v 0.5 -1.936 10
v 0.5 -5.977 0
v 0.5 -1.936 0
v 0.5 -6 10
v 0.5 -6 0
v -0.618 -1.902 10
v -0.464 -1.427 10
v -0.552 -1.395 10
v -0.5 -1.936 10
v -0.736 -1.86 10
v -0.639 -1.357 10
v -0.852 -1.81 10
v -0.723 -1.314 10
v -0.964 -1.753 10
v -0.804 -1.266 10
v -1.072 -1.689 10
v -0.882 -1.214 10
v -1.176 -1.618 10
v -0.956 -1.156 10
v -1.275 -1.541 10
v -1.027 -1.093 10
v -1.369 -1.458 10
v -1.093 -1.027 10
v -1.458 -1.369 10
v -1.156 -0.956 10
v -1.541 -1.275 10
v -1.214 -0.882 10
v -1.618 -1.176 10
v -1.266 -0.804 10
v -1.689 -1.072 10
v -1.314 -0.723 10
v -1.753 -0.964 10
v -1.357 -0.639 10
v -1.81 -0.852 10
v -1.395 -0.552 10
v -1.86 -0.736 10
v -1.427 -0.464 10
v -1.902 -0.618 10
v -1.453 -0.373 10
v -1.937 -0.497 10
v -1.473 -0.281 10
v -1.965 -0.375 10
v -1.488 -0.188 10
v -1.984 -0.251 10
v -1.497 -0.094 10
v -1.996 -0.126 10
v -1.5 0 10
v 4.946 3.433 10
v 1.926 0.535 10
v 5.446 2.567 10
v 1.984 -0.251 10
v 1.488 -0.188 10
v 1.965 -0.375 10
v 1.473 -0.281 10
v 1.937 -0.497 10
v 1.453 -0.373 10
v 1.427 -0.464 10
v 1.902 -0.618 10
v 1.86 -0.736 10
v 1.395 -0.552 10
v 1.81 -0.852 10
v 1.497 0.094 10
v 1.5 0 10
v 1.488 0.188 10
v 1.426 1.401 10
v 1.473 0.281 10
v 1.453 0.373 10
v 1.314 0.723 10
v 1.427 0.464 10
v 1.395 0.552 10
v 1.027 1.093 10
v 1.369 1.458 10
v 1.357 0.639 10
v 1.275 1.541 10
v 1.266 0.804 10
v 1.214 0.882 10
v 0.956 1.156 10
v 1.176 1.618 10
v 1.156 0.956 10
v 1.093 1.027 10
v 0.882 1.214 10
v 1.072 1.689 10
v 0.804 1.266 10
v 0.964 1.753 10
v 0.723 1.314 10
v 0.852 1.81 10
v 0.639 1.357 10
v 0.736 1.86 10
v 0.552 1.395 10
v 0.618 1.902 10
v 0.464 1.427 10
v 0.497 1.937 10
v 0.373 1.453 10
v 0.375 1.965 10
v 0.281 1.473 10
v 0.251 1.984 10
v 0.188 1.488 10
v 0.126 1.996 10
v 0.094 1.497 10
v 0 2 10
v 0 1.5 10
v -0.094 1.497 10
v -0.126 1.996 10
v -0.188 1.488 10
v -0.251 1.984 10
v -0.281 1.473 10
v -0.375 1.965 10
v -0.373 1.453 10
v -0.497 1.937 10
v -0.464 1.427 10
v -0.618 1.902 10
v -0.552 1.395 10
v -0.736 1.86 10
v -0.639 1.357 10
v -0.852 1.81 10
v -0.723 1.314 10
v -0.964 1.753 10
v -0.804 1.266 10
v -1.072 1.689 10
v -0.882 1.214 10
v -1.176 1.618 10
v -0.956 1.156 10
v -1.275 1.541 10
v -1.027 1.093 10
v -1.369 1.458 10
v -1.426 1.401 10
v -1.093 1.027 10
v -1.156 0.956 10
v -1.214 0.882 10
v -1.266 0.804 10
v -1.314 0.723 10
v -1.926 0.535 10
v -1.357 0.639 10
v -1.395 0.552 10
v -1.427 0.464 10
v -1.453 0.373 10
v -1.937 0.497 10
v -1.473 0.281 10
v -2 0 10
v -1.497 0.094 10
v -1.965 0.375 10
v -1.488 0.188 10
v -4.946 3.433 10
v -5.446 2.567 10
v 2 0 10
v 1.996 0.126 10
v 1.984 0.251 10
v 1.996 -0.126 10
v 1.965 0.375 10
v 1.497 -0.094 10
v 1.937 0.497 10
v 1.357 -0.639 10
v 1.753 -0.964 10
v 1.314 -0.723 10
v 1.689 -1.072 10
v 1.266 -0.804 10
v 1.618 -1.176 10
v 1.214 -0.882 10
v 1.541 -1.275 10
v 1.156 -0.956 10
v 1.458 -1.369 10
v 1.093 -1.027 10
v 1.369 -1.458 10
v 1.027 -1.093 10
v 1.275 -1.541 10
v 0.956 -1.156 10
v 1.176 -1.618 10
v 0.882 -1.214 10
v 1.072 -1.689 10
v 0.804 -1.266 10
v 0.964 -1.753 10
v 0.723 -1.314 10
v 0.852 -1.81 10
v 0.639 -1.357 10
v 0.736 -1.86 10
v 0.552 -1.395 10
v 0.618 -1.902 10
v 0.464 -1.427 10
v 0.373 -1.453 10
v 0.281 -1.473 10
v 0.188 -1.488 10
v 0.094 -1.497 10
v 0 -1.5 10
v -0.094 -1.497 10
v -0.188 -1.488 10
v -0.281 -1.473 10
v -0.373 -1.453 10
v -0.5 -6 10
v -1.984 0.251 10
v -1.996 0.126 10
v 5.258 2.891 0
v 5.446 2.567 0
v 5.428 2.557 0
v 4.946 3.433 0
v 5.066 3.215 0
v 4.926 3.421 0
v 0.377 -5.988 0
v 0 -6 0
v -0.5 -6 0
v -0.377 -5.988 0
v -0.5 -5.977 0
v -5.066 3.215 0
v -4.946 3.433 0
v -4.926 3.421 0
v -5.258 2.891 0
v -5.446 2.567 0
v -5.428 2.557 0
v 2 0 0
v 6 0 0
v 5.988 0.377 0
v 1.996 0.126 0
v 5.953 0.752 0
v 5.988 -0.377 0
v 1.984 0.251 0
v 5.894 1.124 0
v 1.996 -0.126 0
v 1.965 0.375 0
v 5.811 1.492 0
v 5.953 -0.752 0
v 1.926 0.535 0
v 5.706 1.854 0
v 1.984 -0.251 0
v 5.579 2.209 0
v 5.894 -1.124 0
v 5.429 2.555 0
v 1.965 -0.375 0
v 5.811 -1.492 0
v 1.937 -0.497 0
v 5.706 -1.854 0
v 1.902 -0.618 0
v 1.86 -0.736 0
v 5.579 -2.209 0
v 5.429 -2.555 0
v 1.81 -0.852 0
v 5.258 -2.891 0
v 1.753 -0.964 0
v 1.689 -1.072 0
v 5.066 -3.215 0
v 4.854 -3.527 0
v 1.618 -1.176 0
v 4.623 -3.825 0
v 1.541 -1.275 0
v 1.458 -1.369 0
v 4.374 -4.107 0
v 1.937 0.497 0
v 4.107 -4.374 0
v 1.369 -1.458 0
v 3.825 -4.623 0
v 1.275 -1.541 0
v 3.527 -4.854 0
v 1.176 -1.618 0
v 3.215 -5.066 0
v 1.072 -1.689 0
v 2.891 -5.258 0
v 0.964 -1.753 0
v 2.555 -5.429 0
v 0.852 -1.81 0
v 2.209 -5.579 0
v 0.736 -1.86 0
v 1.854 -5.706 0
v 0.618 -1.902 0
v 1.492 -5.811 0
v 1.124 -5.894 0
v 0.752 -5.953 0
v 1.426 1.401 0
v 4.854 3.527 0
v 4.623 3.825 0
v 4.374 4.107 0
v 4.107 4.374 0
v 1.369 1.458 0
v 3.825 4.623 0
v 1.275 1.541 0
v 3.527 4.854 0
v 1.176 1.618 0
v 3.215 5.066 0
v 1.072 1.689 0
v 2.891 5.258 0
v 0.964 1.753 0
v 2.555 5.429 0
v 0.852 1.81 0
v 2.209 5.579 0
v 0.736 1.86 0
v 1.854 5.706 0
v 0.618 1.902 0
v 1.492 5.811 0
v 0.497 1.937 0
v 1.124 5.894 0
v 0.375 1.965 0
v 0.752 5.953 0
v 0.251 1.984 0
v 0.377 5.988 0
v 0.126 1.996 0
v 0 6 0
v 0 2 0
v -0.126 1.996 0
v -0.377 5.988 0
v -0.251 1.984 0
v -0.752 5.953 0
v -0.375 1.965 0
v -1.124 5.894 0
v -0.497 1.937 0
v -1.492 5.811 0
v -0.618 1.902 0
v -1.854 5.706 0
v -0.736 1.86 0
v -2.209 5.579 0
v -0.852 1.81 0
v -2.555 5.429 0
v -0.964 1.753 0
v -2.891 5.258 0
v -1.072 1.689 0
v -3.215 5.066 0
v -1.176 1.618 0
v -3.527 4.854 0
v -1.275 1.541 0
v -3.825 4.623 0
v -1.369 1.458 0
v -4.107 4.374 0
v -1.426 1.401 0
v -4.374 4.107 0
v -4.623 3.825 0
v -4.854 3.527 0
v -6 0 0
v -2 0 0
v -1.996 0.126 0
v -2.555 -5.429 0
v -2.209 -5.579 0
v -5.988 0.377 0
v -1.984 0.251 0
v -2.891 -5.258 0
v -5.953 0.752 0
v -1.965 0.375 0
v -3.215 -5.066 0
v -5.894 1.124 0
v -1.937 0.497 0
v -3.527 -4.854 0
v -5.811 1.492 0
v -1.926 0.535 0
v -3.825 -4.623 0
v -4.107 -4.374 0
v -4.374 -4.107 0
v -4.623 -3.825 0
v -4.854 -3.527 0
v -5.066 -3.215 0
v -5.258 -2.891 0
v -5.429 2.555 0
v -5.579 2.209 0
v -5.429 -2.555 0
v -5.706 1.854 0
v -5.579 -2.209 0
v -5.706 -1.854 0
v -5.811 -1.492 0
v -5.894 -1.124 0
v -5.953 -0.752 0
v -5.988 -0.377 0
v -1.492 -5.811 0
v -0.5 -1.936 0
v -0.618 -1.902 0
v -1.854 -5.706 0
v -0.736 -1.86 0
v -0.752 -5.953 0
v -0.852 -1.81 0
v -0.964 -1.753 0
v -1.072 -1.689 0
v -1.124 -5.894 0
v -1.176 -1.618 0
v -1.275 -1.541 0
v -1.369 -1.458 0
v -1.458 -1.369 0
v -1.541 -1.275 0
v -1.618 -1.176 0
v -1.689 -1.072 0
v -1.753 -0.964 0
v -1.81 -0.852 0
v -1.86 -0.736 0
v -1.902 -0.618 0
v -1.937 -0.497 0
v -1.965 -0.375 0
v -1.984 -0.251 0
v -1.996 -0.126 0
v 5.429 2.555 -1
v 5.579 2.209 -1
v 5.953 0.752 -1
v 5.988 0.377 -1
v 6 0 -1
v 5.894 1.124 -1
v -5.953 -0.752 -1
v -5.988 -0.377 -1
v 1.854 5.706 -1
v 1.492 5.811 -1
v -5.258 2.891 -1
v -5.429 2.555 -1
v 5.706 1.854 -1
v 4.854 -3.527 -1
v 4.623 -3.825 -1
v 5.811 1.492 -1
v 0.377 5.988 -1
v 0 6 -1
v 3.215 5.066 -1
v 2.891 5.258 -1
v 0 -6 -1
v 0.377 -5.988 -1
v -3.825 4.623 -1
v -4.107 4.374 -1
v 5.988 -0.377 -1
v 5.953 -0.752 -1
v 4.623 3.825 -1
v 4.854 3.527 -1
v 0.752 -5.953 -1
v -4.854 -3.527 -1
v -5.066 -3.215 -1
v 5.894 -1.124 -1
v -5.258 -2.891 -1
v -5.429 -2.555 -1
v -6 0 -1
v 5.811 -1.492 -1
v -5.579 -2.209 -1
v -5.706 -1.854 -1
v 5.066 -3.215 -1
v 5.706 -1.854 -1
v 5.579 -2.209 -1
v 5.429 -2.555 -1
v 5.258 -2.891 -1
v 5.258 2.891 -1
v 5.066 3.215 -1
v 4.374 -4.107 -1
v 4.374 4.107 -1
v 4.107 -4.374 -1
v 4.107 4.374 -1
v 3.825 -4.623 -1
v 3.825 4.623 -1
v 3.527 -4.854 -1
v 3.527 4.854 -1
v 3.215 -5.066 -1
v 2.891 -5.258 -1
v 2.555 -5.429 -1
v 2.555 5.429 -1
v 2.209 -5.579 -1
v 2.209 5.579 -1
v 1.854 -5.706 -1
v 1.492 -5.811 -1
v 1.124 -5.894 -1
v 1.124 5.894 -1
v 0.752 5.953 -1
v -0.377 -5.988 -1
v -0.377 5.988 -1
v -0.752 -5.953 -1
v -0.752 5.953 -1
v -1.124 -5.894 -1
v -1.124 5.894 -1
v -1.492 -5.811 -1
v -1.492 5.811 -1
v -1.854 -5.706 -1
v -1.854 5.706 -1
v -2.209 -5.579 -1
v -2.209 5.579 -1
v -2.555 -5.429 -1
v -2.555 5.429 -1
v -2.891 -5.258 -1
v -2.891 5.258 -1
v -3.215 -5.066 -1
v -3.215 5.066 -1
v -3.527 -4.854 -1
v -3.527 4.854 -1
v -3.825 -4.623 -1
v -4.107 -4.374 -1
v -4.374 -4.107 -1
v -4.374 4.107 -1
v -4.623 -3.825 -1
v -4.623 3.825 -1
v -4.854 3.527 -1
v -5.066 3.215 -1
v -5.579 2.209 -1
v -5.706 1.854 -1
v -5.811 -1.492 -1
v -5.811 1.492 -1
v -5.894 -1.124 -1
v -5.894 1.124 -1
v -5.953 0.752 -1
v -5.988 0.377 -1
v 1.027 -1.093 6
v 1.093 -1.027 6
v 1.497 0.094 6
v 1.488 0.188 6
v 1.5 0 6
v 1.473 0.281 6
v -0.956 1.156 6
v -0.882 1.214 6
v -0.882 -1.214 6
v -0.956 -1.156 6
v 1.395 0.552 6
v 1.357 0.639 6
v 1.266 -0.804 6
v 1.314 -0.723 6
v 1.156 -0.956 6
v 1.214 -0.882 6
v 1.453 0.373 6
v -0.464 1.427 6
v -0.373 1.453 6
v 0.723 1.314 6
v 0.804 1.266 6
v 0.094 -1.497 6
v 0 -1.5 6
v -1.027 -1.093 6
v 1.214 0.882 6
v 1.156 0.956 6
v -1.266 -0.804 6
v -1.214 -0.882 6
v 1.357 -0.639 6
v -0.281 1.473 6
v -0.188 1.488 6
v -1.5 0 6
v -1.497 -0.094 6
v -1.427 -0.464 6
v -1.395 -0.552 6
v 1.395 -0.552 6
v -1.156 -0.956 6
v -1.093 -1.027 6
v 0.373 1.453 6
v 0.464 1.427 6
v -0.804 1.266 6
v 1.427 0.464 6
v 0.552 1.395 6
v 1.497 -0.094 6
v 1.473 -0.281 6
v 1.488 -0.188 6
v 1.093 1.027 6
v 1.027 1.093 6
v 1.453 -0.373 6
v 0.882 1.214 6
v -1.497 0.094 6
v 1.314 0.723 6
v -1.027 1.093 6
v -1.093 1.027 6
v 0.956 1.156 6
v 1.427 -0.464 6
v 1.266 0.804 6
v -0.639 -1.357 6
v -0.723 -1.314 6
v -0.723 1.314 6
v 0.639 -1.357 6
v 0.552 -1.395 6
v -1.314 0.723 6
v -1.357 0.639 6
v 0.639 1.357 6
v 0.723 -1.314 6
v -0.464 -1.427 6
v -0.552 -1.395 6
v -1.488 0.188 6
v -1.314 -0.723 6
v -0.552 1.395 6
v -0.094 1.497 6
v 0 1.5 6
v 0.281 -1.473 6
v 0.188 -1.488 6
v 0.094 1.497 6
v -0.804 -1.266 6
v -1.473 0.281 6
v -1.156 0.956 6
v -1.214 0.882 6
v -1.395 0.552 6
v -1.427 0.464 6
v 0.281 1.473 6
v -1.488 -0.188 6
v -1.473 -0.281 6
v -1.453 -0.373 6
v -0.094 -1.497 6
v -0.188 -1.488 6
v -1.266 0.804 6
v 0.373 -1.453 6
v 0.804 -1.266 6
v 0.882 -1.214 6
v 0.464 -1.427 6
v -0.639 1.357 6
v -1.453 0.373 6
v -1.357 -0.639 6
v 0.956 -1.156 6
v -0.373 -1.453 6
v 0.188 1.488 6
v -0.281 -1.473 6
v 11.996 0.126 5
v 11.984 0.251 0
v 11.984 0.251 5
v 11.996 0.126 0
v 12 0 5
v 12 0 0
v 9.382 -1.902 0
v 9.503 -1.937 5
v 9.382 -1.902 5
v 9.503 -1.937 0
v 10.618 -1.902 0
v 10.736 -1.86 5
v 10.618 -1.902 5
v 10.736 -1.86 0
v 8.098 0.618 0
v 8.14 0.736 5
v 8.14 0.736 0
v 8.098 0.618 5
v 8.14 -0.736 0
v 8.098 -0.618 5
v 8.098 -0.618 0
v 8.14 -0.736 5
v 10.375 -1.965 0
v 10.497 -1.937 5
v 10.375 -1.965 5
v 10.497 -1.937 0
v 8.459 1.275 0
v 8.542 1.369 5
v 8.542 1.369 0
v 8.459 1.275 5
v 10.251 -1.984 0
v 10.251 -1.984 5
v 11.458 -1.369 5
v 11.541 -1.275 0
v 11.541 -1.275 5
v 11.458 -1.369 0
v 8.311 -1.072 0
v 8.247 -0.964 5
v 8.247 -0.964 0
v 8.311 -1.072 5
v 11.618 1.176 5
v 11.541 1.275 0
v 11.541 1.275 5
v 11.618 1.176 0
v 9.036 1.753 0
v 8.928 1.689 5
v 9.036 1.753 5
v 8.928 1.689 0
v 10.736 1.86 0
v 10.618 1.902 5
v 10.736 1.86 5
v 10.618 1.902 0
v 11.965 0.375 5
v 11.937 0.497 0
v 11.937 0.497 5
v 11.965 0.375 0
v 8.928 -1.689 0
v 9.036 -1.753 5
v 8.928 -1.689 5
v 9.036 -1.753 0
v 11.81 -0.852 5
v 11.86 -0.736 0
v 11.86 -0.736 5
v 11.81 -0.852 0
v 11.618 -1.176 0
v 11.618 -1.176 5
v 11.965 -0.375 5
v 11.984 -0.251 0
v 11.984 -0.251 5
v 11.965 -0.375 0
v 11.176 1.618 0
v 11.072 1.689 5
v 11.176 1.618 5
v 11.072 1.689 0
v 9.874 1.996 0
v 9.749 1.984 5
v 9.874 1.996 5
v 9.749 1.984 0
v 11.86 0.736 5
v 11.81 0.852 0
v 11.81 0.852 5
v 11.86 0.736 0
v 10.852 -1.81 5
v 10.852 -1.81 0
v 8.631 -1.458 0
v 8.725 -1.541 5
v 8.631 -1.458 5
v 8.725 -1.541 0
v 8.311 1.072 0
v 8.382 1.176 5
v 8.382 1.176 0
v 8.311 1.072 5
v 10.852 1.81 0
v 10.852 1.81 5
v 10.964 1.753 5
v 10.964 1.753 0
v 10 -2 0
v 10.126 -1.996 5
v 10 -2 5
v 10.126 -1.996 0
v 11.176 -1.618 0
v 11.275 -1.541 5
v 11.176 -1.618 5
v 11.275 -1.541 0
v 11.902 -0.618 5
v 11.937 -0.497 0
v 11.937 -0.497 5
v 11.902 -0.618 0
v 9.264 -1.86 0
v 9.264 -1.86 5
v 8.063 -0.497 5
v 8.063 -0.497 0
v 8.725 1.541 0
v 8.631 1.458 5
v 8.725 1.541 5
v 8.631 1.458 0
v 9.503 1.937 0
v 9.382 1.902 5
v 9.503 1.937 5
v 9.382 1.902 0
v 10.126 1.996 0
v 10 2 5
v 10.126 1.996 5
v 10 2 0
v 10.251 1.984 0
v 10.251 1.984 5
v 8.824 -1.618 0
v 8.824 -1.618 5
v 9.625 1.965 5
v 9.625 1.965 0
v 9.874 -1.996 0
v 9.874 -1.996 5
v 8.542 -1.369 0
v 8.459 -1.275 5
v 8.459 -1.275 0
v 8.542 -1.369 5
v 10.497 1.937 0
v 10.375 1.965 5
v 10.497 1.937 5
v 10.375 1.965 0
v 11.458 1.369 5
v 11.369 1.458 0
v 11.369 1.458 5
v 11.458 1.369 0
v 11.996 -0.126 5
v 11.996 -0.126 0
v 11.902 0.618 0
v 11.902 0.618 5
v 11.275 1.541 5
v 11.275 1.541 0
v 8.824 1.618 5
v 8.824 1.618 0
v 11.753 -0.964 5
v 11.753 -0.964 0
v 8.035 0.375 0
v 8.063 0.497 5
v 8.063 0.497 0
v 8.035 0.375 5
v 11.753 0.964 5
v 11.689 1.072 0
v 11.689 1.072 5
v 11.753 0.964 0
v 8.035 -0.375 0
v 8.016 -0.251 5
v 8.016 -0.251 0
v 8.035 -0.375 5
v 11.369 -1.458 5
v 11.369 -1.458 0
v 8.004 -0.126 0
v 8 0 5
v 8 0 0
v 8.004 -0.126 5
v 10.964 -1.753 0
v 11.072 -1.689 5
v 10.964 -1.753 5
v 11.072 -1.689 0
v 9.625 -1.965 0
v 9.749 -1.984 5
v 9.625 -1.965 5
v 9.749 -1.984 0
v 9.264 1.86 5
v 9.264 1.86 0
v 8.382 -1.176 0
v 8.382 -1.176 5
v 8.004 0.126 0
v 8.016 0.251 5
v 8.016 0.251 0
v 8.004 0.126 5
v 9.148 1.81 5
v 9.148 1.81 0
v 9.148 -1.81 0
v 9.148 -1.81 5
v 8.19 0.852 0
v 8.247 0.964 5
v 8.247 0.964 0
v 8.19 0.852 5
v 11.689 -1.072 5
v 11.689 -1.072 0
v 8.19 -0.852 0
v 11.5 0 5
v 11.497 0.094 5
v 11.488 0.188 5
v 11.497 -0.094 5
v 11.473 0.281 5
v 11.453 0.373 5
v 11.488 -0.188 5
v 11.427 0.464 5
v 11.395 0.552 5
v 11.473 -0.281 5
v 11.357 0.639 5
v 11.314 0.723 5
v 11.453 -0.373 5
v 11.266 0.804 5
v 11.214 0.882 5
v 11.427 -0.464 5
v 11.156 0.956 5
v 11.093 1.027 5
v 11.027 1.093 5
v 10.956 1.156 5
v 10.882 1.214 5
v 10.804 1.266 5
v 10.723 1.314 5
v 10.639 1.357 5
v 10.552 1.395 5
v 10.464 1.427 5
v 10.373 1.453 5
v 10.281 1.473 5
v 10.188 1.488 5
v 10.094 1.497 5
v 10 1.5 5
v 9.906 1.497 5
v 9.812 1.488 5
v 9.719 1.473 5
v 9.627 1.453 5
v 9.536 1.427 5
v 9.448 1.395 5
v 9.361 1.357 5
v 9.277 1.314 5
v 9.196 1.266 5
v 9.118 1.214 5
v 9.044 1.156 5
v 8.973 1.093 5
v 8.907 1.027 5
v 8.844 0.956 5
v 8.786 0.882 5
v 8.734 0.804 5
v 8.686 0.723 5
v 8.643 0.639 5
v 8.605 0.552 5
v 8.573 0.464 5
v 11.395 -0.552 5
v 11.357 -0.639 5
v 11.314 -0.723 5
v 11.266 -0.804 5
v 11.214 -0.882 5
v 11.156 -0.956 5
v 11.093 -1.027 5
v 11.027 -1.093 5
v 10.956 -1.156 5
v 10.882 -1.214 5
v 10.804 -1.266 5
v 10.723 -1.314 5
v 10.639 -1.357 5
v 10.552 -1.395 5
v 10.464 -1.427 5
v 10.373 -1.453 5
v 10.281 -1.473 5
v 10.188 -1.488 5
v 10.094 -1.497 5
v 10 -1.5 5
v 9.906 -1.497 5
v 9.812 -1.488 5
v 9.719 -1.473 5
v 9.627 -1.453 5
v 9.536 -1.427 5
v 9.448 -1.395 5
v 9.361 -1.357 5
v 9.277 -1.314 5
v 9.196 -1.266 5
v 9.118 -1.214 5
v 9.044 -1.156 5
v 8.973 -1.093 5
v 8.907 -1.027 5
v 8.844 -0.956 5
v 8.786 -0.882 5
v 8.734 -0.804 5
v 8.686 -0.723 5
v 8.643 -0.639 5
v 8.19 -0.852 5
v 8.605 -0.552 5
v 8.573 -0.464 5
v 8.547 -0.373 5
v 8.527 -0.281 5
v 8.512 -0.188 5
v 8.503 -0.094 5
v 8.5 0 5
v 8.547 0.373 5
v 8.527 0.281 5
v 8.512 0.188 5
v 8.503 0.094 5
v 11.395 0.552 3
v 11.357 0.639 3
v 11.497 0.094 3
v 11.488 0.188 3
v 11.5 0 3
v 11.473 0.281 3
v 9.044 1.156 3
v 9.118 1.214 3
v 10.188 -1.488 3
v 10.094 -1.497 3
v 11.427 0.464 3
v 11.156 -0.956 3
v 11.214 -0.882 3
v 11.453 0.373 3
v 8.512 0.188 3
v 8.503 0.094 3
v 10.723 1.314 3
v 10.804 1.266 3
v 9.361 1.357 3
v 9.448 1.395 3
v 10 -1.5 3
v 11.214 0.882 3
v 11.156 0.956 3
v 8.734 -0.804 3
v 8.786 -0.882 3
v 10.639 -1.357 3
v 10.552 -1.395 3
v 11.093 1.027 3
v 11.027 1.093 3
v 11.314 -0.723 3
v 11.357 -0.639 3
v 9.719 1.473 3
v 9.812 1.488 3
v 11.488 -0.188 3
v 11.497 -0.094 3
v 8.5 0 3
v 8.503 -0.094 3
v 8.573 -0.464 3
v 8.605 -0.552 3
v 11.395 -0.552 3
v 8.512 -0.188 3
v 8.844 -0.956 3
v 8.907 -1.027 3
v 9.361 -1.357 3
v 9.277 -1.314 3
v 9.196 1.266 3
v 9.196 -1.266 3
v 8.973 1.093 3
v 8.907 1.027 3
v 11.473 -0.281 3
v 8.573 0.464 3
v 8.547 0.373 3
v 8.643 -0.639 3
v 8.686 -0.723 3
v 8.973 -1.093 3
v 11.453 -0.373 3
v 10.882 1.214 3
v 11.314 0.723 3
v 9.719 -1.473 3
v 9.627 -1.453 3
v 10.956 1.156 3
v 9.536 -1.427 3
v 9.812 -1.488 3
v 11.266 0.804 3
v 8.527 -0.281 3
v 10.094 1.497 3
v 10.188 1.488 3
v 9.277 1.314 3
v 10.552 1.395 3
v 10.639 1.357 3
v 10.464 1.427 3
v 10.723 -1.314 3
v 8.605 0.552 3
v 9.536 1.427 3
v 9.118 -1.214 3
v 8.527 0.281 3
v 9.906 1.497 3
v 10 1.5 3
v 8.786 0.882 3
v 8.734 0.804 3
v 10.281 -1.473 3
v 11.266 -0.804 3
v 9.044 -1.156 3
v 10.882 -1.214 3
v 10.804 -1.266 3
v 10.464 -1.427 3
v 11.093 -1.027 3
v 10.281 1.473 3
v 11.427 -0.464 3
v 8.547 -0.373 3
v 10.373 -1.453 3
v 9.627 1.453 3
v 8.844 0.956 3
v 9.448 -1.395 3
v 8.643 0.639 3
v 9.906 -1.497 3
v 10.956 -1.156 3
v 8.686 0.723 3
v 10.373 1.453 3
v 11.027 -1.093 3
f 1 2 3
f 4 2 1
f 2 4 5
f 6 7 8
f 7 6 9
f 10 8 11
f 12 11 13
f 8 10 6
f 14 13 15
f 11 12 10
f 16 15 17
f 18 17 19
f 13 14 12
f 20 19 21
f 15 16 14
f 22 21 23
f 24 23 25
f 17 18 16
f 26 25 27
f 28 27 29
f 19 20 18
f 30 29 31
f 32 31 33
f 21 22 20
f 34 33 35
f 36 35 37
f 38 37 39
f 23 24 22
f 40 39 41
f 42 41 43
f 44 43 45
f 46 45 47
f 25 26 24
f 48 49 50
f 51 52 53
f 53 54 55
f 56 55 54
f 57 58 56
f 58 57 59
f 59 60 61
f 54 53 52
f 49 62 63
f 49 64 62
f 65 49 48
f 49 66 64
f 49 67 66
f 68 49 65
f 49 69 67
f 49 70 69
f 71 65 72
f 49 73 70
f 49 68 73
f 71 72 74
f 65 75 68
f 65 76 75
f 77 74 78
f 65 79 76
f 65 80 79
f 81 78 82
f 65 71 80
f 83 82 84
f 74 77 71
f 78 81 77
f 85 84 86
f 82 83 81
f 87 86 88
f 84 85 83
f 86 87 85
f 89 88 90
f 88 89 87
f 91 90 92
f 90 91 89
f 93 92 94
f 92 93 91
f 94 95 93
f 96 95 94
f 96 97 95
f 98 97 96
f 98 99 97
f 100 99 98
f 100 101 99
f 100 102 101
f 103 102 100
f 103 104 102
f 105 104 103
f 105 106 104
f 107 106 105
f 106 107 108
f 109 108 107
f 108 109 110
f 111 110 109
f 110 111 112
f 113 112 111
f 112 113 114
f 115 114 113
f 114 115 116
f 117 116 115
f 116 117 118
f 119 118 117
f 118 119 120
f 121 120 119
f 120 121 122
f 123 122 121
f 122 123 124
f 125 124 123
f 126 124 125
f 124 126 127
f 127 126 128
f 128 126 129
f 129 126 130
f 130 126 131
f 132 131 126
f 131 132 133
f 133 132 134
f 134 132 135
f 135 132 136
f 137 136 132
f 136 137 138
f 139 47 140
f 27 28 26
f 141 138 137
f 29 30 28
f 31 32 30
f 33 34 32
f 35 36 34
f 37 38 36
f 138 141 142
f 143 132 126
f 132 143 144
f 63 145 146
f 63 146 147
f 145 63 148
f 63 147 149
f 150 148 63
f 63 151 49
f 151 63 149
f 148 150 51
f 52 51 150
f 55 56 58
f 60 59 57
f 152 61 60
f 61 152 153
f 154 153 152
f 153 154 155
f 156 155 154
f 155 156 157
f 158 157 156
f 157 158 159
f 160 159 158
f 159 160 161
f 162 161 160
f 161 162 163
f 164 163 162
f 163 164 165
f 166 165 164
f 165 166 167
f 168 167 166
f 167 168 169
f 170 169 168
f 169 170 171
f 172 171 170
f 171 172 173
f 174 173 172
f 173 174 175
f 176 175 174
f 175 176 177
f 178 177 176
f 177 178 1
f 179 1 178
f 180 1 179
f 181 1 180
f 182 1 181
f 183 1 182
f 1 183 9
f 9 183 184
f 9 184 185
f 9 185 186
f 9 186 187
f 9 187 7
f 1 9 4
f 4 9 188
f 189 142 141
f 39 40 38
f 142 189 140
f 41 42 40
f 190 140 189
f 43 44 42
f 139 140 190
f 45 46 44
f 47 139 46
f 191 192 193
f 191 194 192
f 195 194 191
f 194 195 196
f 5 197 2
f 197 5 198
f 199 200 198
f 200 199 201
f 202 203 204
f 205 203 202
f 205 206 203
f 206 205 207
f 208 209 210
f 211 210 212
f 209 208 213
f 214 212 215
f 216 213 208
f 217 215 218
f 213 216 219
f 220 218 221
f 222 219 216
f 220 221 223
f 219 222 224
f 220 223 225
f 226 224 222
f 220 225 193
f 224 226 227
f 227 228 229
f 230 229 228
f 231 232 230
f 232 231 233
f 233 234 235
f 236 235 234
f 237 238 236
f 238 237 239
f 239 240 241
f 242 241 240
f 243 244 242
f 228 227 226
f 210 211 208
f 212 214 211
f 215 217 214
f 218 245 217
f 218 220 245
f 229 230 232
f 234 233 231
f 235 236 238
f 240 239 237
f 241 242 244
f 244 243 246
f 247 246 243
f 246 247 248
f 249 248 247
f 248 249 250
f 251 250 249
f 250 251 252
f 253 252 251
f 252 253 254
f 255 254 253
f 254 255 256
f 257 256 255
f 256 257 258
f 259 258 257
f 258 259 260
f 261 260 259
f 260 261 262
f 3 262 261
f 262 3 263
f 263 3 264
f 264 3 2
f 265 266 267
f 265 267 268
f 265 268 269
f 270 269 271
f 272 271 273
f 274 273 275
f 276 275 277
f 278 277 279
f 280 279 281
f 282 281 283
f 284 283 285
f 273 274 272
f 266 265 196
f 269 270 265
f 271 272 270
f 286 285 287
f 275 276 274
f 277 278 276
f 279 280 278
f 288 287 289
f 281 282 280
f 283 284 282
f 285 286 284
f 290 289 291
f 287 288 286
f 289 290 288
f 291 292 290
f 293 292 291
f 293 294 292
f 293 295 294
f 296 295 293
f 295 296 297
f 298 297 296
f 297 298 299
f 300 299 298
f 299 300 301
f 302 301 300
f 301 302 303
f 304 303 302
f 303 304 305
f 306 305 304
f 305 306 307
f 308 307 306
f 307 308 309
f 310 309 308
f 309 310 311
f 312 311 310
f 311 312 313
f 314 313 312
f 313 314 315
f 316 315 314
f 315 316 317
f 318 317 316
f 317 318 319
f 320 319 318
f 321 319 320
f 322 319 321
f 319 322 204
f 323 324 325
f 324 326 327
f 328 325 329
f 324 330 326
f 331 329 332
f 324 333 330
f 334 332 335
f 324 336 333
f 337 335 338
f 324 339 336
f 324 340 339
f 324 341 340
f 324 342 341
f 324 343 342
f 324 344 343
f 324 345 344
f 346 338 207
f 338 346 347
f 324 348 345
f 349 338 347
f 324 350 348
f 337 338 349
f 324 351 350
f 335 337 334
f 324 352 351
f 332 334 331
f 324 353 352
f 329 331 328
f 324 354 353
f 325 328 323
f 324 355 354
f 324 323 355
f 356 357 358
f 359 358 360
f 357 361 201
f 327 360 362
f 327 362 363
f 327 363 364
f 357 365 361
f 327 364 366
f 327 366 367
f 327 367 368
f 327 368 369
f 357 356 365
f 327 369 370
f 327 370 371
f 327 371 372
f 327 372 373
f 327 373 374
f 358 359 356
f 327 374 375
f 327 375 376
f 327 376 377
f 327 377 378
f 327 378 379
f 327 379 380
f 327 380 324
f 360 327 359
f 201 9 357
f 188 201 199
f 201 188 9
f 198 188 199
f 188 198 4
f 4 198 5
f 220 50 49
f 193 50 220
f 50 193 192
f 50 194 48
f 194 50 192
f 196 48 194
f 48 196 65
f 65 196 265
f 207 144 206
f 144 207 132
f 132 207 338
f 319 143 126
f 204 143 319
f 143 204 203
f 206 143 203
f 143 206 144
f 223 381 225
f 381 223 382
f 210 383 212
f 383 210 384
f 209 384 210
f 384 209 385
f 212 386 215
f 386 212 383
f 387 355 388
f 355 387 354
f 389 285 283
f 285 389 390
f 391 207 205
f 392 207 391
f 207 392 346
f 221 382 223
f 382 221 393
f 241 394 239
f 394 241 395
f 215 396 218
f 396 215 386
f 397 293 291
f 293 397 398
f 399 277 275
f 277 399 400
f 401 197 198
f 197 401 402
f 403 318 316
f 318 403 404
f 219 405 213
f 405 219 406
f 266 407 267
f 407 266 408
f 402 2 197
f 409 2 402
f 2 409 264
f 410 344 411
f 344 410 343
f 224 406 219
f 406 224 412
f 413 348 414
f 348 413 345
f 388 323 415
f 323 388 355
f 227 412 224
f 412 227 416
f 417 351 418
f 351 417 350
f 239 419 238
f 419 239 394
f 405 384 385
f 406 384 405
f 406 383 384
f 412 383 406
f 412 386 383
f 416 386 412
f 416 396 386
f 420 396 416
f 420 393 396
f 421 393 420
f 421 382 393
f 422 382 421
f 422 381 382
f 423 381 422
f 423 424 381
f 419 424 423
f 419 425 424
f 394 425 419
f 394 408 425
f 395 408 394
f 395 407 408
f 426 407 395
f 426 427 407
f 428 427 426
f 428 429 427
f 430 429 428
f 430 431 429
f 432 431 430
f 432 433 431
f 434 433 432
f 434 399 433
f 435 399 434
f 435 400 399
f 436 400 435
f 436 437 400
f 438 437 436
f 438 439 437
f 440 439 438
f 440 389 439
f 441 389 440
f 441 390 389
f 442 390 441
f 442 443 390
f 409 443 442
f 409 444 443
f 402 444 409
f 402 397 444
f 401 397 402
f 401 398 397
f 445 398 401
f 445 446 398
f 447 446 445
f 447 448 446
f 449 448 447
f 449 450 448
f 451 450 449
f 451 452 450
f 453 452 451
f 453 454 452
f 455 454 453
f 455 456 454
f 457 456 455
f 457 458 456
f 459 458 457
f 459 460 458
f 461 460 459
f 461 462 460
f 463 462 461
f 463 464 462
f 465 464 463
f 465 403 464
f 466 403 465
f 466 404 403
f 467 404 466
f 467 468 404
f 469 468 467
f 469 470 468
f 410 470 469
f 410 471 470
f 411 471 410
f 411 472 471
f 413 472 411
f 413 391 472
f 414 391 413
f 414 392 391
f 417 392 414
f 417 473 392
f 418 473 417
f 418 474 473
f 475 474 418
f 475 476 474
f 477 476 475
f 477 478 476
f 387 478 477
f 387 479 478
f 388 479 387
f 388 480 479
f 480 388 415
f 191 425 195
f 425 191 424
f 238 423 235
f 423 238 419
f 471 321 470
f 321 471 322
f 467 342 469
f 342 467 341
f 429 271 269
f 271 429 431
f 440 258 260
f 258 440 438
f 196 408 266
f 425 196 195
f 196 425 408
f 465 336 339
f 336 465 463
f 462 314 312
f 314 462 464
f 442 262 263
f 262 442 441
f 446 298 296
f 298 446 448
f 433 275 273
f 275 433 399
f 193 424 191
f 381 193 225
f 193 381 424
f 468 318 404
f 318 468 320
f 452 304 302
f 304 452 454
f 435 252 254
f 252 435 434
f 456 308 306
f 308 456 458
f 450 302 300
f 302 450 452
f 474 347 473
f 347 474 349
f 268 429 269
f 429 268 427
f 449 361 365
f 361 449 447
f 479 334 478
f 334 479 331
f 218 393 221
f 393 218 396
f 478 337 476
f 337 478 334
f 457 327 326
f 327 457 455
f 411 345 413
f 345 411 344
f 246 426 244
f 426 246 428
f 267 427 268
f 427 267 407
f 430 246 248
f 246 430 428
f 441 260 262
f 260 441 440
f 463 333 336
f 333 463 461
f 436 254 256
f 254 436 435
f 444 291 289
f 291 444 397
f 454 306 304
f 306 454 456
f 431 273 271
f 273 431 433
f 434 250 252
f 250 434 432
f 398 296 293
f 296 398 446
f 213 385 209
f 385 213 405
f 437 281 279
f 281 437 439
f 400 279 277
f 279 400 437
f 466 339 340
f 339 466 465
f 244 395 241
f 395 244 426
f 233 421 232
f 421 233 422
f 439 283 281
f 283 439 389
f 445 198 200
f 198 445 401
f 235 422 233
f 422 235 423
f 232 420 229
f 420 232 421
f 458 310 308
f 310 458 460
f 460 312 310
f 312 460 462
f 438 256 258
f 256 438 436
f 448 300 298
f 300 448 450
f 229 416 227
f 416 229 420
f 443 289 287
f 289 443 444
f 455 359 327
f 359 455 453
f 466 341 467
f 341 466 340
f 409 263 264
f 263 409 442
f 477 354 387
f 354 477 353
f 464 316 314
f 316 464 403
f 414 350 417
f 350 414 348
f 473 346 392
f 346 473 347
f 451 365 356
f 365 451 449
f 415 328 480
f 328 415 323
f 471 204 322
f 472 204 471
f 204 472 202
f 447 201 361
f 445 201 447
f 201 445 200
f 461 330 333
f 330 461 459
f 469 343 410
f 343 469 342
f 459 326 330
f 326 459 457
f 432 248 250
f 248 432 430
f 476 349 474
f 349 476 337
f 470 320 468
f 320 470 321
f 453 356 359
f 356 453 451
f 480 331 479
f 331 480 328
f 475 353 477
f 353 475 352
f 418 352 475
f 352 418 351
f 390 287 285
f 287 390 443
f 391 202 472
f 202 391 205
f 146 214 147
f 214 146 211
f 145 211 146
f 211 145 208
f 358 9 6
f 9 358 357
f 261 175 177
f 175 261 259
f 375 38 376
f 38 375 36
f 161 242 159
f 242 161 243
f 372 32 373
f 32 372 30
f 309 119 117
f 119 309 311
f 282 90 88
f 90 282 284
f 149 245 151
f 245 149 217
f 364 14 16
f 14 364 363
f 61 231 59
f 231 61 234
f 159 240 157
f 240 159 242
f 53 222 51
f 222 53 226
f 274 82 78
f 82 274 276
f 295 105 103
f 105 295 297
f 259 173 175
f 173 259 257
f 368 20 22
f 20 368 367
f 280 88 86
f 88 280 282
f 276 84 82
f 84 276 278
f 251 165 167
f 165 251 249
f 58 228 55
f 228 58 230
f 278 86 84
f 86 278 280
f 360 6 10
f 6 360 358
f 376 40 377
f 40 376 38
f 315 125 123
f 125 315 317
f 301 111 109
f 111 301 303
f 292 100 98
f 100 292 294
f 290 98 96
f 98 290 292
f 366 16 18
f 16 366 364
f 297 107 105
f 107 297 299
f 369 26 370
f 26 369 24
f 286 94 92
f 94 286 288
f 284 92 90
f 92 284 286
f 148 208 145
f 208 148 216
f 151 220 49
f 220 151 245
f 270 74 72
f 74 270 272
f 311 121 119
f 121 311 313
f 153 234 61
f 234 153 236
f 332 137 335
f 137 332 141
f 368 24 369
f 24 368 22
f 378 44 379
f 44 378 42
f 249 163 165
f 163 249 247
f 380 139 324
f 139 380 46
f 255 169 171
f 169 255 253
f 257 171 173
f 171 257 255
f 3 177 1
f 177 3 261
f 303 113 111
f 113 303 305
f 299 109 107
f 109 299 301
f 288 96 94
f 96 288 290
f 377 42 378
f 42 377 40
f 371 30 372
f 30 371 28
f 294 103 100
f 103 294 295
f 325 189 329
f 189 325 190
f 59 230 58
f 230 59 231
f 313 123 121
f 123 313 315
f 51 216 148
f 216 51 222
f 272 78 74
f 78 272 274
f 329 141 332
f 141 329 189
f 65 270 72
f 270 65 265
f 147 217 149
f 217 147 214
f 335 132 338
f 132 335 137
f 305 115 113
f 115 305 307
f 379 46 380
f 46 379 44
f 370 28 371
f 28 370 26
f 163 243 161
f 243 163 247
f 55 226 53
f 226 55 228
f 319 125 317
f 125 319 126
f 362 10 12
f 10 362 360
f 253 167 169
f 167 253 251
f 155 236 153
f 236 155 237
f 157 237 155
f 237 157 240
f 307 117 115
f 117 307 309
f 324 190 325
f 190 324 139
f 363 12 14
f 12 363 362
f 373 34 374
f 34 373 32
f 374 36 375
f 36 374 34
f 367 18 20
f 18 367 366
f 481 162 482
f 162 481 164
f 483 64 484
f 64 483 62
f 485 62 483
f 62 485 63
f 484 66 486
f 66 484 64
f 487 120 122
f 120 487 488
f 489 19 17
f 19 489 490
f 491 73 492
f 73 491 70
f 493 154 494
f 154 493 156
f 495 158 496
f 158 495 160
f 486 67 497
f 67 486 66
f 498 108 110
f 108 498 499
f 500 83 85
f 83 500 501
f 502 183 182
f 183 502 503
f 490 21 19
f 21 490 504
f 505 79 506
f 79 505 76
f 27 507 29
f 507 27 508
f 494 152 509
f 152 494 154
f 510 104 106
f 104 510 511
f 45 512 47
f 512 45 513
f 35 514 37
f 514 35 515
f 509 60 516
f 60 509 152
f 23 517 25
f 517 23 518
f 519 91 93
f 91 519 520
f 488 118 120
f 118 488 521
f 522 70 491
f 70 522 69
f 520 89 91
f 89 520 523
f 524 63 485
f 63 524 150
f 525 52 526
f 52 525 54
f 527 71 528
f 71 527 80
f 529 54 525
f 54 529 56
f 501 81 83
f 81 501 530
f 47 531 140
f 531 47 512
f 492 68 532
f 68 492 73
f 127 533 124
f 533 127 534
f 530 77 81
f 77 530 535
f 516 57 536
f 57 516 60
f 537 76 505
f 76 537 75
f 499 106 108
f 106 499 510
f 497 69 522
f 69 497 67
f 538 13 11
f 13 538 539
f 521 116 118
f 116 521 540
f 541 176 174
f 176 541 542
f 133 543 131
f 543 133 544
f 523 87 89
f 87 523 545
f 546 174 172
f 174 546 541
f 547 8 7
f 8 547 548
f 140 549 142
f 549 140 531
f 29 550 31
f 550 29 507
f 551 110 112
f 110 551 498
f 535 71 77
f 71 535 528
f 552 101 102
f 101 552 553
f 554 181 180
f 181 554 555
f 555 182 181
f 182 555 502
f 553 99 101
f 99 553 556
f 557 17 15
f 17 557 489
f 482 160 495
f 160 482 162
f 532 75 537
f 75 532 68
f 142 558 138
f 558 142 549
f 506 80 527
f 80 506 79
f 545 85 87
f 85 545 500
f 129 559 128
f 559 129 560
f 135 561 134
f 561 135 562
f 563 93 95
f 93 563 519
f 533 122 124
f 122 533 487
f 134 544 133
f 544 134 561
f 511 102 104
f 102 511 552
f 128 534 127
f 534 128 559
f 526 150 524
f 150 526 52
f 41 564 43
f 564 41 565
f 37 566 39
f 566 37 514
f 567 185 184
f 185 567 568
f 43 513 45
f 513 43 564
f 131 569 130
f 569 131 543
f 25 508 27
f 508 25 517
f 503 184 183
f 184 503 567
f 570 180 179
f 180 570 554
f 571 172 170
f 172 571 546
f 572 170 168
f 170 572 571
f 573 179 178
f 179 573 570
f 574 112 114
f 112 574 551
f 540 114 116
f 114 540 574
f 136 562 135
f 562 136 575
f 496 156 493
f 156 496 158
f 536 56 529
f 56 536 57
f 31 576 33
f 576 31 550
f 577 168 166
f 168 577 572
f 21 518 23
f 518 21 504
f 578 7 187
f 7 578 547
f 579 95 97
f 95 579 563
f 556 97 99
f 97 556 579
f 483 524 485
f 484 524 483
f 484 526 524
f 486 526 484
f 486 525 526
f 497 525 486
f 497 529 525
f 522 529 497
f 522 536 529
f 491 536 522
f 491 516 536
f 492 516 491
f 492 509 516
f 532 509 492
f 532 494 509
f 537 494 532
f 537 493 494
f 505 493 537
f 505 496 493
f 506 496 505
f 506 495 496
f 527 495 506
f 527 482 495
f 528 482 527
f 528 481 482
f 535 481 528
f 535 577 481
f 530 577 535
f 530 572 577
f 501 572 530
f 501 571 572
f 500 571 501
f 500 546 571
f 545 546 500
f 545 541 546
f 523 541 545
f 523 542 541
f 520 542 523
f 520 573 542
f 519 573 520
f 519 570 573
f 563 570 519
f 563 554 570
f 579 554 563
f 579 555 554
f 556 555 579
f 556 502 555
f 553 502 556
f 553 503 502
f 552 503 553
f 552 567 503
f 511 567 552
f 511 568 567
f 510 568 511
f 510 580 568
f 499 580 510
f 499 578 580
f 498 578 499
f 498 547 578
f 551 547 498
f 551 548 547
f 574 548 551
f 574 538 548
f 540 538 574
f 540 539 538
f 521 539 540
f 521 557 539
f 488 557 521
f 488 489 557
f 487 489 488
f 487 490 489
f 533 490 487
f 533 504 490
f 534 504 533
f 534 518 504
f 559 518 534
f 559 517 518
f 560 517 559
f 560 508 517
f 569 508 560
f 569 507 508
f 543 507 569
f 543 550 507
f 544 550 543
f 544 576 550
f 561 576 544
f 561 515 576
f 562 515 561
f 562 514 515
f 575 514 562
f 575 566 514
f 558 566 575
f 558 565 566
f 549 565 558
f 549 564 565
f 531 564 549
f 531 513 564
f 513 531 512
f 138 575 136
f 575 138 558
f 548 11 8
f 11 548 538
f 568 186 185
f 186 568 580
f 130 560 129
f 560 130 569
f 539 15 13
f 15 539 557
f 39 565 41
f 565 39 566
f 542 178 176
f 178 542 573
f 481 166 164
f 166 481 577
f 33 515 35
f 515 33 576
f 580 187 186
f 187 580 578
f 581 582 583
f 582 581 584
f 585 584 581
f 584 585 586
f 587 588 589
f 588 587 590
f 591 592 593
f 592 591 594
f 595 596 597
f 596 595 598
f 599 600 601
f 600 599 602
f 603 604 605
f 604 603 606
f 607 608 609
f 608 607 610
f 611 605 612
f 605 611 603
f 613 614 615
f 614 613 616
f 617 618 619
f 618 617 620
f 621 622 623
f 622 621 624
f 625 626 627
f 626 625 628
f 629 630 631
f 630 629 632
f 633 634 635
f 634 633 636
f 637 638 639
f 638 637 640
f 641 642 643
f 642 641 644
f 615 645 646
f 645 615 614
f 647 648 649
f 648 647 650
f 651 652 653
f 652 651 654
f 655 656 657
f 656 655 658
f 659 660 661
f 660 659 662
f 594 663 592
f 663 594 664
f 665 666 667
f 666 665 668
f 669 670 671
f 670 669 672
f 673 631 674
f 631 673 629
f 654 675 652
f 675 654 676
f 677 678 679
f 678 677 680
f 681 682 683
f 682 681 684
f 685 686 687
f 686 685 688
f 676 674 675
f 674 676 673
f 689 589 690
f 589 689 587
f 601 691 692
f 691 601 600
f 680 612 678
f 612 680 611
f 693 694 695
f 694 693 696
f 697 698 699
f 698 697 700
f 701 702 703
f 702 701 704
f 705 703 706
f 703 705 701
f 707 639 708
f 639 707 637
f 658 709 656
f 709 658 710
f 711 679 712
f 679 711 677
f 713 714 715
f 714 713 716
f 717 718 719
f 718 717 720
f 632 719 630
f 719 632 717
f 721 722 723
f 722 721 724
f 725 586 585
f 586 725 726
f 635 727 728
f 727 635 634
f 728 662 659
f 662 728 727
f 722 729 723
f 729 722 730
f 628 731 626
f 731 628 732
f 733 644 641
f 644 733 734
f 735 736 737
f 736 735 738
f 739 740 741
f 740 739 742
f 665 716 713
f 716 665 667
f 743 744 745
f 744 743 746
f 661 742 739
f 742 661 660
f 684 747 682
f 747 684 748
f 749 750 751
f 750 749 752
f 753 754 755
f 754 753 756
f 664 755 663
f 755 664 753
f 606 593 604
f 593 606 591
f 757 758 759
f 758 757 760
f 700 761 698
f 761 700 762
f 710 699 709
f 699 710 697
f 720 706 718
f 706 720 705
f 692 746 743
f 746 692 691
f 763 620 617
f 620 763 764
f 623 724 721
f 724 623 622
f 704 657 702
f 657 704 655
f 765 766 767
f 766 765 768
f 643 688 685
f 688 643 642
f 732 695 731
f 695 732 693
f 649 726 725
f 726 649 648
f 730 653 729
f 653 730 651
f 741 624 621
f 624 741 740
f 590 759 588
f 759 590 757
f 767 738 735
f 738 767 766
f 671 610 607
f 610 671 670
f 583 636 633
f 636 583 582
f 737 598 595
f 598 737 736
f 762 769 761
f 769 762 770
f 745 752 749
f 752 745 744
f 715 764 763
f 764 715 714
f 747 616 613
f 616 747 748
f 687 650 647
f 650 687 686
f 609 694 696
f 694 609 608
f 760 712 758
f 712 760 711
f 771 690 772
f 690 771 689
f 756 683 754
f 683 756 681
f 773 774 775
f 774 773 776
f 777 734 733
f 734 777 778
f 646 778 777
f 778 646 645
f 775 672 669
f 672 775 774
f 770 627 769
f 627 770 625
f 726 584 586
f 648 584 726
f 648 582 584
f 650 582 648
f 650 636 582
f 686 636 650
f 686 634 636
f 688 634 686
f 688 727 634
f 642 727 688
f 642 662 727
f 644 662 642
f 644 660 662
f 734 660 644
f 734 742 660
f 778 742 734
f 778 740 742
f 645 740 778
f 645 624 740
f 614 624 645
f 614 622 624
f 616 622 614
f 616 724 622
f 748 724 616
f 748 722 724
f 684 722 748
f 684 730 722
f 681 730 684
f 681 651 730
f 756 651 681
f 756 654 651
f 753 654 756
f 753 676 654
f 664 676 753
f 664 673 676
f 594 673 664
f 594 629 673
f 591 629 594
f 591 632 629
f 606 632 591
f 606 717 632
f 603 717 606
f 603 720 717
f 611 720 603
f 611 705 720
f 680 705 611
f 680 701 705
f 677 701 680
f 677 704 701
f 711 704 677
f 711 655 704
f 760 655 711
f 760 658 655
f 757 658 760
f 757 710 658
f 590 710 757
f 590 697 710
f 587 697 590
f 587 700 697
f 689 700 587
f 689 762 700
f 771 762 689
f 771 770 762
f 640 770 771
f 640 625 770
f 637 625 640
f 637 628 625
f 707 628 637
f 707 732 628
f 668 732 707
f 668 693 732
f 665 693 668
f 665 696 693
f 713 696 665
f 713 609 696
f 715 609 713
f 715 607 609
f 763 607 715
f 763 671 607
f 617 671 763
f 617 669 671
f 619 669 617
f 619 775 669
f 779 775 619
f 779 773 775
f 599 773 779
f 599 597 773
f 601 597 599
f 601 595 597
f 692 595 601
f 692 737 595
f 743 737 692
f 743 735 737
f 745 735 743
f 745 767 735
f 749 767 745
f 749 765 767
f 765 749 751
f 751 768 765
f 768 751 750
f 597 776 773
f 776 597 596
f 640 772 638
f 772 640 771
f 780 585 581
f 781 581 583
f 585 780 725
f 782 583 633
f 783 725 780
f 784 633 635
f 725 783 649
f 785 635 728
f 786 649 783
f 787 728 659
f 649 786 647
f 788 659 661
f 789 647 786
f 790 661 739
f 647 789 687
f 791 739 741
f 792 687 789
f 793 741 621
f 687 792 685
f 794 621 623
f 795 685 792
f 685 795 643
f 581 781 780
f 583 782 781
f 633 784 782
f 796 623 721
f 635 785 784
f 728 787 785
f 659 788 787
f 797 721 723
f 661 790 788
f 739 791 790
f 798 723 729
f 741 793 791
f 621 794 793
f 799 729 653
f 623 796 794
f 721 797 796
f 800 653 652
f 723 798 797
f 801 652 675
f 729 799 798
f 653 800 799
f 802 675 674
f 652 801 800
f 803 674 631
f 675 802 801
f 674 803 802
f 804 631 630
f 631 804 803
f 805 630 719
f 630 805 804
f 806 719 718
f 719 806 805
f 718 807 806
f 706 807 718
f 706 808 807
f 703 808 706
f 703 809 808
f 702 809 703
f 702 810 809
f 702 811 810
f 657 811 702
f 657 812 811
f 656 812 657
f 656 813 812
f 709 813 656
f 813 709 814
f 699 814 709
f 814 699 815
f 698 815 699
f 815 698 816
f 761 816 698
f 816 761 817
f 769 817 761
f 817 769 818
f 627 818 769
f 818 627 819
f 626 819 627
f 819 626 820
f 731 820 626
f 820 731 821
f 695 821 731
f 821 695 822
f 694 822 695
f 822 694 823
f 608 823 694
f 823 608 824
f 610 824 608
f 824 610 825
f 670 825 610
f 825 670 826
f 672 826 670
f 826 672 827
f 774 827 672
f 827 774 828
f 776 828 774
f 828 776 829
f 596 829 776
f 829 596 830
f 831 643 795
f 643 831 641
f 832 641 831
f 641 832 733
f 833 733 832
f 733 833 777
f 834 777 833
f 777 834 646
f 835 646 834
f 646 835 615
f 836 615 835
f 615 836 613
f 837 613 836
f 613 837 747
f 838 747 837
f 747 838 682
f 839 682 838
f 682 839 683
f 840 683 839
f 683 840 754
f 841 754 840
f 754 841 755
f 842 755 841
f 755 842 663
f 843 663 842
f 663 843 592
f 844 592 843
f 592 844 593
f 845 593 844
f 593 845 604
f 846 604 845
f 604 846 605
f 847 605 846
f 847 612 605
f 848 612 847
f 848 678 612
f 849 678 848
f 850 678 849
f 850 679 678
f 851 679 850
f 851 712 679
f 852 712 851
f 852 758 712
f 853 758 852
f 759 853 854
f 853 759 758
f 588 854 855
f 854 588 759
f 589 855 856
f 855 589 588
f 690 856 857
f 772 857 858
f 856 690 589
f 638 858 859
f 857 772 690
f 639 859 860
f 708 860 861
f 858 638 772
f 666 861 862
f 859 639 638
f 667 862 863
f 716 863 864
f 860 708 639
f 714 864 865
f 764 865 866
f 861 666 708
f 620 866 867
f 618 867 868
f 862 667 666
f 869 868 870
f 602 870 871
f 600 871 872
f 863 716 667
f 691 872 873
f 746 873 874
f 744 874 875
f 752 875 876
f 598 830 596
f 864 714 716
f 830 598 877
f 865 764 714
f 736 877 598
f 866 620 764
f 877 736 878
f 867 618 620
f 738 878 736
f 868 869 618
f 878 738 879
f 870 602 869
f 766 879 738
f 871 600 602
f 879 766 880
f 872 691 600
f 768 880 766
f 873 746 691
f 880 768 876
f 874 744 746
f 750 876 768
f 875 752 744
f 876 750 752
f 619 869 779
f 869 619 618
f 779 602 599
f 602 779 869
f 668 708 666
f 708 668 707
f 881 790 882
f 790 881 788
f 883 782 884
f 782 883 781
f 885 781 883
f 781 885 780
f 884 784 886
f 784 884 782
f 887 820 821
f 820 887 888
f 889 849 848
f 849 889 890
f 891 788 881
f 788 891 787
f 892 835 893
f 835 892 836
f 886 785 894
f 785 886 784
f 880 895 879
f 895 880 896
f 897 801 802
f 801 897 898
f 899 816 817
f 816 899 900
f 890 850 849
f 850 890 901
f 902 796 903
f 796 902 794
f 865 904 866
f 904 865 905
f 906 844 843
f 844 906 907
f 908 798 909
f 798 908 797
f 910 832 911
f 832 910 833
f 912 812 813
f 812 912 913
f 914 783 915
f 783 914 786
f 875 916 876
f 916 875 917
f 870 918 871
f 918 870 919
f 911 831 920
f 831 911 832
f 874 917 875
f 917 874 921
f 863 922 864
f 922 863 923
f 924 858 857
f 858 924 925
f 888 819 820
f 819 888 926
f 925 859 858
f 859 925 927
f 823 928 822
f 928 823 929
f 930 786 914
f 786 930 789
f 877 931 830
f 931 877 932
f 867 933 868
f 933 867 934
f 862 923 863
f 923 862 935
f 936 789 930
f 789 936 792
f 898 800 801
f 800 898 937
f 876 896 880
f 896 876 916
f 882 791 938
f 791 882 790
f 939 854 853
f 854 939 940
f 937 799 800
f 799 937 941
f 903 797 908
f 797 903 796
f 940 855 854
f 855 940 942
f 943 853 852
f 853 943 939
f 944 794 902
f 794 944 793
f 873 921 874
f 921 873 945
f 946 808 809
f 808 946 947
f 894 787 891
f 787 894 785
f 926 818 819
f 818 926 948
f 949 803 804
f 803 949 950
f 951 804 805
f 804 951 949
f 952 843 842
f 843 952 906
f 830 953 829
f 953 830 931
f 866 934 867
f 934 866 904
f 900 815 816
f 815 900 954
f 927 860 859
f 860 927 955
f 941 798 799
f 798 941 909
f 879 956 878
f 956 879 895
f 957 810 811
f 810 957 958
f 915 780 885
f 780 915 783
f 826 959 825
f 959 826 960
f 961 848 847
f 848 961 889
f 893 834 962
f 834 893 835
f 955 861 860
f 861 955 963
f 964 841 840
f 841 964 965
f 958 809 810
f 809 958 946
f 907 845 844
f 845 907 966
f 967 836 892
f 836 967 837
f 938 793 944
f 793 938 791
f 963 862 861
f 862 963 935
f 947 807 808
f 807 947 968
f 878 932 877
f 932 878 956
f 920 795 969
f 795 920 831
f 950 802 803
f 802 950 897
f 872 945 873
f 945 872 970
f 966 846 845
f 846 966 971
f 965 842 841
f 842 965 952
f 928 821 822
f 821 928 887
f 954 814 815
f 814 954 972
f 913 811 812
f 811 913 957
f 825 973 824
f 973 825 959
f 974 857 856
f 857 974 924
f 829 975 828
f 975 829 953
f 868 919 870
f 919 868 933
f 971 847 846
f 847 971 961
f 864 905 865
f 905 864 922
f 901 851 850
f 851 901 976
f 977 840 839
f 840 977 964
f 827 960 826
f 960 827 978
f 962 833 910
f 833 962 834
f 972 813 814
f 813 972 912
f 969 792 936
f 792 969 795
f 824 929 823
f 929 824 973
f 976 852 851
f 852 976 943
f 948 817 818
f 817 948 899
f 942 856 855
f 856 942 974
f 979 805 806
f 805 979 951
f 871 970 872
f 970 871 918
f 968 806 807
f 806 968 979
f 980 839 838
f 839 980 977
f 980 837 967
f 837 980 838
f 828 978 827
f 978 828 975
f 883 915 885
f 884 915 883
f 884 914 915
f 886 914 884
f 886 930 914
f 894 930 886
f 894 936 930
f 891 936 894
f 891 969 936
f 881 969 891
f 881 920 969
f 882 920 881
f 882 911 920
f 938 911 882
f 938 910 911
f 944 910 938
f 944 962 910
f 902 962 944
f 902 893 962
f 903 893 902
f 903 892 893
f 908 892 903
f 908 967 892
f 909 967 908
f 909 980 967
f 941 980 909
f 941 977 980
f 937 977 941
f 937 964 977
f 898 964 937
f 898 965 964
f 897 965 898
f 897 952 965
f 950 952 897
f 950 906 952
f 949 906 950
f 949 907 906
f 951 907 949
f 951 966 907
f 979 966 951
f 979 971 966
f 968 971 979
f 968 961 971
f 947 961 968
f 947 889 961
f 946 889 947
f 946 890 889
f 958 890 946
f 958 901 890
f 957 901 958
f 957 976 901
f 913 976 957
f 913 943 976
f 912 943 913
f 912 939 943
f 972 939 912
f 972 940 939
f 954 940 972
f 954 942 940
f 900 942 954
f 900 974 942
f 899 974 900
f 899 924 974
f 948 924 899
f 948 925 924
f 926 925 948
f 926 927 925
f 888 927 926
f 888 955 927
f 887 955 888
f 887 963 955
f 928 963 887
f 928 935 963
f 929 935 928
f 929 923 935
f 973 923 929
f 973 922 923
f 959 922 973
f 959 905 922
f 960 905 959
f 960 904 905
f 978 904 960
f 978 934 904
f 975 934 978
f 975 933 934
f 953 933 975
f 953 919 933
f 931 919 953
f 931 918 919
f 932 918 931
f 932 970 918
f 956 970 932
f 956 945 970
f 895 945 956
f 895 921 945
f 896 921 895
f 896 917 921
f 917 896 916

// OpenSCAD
$fn = 100; 
   
strength = 0.2;
radius_bottom = 10;
radius_top = 2;

module leg()
{
  translate([-0.5,-6,0])
        cube([1,5,10]);
}

module sensor_holder()
{
  difference()
  {
    tripod();   
    
    translate([0,0,6])
      cylinder(h=5,r=1.5);
  } 
}

module tripod()
{
  leg();
    
  rotate([0,0,120])
    leg();
    
  rotate([0,0,240])
    leg();
  
  translate([0,0,-1])
    cylinder(h=1,r=6);
  
  translate([0,0,0])
      cylinder(h=10,r=2);
}

module head()
{  
  difference()
  {
    translate([0,0,0])
      cylinder(h=5,r=2);
    
    translate([0,0,3])
      cylinder(h=2.5,r=1.5);
  }
}


sensor_holder();

translate([10,0,0])
  head();
